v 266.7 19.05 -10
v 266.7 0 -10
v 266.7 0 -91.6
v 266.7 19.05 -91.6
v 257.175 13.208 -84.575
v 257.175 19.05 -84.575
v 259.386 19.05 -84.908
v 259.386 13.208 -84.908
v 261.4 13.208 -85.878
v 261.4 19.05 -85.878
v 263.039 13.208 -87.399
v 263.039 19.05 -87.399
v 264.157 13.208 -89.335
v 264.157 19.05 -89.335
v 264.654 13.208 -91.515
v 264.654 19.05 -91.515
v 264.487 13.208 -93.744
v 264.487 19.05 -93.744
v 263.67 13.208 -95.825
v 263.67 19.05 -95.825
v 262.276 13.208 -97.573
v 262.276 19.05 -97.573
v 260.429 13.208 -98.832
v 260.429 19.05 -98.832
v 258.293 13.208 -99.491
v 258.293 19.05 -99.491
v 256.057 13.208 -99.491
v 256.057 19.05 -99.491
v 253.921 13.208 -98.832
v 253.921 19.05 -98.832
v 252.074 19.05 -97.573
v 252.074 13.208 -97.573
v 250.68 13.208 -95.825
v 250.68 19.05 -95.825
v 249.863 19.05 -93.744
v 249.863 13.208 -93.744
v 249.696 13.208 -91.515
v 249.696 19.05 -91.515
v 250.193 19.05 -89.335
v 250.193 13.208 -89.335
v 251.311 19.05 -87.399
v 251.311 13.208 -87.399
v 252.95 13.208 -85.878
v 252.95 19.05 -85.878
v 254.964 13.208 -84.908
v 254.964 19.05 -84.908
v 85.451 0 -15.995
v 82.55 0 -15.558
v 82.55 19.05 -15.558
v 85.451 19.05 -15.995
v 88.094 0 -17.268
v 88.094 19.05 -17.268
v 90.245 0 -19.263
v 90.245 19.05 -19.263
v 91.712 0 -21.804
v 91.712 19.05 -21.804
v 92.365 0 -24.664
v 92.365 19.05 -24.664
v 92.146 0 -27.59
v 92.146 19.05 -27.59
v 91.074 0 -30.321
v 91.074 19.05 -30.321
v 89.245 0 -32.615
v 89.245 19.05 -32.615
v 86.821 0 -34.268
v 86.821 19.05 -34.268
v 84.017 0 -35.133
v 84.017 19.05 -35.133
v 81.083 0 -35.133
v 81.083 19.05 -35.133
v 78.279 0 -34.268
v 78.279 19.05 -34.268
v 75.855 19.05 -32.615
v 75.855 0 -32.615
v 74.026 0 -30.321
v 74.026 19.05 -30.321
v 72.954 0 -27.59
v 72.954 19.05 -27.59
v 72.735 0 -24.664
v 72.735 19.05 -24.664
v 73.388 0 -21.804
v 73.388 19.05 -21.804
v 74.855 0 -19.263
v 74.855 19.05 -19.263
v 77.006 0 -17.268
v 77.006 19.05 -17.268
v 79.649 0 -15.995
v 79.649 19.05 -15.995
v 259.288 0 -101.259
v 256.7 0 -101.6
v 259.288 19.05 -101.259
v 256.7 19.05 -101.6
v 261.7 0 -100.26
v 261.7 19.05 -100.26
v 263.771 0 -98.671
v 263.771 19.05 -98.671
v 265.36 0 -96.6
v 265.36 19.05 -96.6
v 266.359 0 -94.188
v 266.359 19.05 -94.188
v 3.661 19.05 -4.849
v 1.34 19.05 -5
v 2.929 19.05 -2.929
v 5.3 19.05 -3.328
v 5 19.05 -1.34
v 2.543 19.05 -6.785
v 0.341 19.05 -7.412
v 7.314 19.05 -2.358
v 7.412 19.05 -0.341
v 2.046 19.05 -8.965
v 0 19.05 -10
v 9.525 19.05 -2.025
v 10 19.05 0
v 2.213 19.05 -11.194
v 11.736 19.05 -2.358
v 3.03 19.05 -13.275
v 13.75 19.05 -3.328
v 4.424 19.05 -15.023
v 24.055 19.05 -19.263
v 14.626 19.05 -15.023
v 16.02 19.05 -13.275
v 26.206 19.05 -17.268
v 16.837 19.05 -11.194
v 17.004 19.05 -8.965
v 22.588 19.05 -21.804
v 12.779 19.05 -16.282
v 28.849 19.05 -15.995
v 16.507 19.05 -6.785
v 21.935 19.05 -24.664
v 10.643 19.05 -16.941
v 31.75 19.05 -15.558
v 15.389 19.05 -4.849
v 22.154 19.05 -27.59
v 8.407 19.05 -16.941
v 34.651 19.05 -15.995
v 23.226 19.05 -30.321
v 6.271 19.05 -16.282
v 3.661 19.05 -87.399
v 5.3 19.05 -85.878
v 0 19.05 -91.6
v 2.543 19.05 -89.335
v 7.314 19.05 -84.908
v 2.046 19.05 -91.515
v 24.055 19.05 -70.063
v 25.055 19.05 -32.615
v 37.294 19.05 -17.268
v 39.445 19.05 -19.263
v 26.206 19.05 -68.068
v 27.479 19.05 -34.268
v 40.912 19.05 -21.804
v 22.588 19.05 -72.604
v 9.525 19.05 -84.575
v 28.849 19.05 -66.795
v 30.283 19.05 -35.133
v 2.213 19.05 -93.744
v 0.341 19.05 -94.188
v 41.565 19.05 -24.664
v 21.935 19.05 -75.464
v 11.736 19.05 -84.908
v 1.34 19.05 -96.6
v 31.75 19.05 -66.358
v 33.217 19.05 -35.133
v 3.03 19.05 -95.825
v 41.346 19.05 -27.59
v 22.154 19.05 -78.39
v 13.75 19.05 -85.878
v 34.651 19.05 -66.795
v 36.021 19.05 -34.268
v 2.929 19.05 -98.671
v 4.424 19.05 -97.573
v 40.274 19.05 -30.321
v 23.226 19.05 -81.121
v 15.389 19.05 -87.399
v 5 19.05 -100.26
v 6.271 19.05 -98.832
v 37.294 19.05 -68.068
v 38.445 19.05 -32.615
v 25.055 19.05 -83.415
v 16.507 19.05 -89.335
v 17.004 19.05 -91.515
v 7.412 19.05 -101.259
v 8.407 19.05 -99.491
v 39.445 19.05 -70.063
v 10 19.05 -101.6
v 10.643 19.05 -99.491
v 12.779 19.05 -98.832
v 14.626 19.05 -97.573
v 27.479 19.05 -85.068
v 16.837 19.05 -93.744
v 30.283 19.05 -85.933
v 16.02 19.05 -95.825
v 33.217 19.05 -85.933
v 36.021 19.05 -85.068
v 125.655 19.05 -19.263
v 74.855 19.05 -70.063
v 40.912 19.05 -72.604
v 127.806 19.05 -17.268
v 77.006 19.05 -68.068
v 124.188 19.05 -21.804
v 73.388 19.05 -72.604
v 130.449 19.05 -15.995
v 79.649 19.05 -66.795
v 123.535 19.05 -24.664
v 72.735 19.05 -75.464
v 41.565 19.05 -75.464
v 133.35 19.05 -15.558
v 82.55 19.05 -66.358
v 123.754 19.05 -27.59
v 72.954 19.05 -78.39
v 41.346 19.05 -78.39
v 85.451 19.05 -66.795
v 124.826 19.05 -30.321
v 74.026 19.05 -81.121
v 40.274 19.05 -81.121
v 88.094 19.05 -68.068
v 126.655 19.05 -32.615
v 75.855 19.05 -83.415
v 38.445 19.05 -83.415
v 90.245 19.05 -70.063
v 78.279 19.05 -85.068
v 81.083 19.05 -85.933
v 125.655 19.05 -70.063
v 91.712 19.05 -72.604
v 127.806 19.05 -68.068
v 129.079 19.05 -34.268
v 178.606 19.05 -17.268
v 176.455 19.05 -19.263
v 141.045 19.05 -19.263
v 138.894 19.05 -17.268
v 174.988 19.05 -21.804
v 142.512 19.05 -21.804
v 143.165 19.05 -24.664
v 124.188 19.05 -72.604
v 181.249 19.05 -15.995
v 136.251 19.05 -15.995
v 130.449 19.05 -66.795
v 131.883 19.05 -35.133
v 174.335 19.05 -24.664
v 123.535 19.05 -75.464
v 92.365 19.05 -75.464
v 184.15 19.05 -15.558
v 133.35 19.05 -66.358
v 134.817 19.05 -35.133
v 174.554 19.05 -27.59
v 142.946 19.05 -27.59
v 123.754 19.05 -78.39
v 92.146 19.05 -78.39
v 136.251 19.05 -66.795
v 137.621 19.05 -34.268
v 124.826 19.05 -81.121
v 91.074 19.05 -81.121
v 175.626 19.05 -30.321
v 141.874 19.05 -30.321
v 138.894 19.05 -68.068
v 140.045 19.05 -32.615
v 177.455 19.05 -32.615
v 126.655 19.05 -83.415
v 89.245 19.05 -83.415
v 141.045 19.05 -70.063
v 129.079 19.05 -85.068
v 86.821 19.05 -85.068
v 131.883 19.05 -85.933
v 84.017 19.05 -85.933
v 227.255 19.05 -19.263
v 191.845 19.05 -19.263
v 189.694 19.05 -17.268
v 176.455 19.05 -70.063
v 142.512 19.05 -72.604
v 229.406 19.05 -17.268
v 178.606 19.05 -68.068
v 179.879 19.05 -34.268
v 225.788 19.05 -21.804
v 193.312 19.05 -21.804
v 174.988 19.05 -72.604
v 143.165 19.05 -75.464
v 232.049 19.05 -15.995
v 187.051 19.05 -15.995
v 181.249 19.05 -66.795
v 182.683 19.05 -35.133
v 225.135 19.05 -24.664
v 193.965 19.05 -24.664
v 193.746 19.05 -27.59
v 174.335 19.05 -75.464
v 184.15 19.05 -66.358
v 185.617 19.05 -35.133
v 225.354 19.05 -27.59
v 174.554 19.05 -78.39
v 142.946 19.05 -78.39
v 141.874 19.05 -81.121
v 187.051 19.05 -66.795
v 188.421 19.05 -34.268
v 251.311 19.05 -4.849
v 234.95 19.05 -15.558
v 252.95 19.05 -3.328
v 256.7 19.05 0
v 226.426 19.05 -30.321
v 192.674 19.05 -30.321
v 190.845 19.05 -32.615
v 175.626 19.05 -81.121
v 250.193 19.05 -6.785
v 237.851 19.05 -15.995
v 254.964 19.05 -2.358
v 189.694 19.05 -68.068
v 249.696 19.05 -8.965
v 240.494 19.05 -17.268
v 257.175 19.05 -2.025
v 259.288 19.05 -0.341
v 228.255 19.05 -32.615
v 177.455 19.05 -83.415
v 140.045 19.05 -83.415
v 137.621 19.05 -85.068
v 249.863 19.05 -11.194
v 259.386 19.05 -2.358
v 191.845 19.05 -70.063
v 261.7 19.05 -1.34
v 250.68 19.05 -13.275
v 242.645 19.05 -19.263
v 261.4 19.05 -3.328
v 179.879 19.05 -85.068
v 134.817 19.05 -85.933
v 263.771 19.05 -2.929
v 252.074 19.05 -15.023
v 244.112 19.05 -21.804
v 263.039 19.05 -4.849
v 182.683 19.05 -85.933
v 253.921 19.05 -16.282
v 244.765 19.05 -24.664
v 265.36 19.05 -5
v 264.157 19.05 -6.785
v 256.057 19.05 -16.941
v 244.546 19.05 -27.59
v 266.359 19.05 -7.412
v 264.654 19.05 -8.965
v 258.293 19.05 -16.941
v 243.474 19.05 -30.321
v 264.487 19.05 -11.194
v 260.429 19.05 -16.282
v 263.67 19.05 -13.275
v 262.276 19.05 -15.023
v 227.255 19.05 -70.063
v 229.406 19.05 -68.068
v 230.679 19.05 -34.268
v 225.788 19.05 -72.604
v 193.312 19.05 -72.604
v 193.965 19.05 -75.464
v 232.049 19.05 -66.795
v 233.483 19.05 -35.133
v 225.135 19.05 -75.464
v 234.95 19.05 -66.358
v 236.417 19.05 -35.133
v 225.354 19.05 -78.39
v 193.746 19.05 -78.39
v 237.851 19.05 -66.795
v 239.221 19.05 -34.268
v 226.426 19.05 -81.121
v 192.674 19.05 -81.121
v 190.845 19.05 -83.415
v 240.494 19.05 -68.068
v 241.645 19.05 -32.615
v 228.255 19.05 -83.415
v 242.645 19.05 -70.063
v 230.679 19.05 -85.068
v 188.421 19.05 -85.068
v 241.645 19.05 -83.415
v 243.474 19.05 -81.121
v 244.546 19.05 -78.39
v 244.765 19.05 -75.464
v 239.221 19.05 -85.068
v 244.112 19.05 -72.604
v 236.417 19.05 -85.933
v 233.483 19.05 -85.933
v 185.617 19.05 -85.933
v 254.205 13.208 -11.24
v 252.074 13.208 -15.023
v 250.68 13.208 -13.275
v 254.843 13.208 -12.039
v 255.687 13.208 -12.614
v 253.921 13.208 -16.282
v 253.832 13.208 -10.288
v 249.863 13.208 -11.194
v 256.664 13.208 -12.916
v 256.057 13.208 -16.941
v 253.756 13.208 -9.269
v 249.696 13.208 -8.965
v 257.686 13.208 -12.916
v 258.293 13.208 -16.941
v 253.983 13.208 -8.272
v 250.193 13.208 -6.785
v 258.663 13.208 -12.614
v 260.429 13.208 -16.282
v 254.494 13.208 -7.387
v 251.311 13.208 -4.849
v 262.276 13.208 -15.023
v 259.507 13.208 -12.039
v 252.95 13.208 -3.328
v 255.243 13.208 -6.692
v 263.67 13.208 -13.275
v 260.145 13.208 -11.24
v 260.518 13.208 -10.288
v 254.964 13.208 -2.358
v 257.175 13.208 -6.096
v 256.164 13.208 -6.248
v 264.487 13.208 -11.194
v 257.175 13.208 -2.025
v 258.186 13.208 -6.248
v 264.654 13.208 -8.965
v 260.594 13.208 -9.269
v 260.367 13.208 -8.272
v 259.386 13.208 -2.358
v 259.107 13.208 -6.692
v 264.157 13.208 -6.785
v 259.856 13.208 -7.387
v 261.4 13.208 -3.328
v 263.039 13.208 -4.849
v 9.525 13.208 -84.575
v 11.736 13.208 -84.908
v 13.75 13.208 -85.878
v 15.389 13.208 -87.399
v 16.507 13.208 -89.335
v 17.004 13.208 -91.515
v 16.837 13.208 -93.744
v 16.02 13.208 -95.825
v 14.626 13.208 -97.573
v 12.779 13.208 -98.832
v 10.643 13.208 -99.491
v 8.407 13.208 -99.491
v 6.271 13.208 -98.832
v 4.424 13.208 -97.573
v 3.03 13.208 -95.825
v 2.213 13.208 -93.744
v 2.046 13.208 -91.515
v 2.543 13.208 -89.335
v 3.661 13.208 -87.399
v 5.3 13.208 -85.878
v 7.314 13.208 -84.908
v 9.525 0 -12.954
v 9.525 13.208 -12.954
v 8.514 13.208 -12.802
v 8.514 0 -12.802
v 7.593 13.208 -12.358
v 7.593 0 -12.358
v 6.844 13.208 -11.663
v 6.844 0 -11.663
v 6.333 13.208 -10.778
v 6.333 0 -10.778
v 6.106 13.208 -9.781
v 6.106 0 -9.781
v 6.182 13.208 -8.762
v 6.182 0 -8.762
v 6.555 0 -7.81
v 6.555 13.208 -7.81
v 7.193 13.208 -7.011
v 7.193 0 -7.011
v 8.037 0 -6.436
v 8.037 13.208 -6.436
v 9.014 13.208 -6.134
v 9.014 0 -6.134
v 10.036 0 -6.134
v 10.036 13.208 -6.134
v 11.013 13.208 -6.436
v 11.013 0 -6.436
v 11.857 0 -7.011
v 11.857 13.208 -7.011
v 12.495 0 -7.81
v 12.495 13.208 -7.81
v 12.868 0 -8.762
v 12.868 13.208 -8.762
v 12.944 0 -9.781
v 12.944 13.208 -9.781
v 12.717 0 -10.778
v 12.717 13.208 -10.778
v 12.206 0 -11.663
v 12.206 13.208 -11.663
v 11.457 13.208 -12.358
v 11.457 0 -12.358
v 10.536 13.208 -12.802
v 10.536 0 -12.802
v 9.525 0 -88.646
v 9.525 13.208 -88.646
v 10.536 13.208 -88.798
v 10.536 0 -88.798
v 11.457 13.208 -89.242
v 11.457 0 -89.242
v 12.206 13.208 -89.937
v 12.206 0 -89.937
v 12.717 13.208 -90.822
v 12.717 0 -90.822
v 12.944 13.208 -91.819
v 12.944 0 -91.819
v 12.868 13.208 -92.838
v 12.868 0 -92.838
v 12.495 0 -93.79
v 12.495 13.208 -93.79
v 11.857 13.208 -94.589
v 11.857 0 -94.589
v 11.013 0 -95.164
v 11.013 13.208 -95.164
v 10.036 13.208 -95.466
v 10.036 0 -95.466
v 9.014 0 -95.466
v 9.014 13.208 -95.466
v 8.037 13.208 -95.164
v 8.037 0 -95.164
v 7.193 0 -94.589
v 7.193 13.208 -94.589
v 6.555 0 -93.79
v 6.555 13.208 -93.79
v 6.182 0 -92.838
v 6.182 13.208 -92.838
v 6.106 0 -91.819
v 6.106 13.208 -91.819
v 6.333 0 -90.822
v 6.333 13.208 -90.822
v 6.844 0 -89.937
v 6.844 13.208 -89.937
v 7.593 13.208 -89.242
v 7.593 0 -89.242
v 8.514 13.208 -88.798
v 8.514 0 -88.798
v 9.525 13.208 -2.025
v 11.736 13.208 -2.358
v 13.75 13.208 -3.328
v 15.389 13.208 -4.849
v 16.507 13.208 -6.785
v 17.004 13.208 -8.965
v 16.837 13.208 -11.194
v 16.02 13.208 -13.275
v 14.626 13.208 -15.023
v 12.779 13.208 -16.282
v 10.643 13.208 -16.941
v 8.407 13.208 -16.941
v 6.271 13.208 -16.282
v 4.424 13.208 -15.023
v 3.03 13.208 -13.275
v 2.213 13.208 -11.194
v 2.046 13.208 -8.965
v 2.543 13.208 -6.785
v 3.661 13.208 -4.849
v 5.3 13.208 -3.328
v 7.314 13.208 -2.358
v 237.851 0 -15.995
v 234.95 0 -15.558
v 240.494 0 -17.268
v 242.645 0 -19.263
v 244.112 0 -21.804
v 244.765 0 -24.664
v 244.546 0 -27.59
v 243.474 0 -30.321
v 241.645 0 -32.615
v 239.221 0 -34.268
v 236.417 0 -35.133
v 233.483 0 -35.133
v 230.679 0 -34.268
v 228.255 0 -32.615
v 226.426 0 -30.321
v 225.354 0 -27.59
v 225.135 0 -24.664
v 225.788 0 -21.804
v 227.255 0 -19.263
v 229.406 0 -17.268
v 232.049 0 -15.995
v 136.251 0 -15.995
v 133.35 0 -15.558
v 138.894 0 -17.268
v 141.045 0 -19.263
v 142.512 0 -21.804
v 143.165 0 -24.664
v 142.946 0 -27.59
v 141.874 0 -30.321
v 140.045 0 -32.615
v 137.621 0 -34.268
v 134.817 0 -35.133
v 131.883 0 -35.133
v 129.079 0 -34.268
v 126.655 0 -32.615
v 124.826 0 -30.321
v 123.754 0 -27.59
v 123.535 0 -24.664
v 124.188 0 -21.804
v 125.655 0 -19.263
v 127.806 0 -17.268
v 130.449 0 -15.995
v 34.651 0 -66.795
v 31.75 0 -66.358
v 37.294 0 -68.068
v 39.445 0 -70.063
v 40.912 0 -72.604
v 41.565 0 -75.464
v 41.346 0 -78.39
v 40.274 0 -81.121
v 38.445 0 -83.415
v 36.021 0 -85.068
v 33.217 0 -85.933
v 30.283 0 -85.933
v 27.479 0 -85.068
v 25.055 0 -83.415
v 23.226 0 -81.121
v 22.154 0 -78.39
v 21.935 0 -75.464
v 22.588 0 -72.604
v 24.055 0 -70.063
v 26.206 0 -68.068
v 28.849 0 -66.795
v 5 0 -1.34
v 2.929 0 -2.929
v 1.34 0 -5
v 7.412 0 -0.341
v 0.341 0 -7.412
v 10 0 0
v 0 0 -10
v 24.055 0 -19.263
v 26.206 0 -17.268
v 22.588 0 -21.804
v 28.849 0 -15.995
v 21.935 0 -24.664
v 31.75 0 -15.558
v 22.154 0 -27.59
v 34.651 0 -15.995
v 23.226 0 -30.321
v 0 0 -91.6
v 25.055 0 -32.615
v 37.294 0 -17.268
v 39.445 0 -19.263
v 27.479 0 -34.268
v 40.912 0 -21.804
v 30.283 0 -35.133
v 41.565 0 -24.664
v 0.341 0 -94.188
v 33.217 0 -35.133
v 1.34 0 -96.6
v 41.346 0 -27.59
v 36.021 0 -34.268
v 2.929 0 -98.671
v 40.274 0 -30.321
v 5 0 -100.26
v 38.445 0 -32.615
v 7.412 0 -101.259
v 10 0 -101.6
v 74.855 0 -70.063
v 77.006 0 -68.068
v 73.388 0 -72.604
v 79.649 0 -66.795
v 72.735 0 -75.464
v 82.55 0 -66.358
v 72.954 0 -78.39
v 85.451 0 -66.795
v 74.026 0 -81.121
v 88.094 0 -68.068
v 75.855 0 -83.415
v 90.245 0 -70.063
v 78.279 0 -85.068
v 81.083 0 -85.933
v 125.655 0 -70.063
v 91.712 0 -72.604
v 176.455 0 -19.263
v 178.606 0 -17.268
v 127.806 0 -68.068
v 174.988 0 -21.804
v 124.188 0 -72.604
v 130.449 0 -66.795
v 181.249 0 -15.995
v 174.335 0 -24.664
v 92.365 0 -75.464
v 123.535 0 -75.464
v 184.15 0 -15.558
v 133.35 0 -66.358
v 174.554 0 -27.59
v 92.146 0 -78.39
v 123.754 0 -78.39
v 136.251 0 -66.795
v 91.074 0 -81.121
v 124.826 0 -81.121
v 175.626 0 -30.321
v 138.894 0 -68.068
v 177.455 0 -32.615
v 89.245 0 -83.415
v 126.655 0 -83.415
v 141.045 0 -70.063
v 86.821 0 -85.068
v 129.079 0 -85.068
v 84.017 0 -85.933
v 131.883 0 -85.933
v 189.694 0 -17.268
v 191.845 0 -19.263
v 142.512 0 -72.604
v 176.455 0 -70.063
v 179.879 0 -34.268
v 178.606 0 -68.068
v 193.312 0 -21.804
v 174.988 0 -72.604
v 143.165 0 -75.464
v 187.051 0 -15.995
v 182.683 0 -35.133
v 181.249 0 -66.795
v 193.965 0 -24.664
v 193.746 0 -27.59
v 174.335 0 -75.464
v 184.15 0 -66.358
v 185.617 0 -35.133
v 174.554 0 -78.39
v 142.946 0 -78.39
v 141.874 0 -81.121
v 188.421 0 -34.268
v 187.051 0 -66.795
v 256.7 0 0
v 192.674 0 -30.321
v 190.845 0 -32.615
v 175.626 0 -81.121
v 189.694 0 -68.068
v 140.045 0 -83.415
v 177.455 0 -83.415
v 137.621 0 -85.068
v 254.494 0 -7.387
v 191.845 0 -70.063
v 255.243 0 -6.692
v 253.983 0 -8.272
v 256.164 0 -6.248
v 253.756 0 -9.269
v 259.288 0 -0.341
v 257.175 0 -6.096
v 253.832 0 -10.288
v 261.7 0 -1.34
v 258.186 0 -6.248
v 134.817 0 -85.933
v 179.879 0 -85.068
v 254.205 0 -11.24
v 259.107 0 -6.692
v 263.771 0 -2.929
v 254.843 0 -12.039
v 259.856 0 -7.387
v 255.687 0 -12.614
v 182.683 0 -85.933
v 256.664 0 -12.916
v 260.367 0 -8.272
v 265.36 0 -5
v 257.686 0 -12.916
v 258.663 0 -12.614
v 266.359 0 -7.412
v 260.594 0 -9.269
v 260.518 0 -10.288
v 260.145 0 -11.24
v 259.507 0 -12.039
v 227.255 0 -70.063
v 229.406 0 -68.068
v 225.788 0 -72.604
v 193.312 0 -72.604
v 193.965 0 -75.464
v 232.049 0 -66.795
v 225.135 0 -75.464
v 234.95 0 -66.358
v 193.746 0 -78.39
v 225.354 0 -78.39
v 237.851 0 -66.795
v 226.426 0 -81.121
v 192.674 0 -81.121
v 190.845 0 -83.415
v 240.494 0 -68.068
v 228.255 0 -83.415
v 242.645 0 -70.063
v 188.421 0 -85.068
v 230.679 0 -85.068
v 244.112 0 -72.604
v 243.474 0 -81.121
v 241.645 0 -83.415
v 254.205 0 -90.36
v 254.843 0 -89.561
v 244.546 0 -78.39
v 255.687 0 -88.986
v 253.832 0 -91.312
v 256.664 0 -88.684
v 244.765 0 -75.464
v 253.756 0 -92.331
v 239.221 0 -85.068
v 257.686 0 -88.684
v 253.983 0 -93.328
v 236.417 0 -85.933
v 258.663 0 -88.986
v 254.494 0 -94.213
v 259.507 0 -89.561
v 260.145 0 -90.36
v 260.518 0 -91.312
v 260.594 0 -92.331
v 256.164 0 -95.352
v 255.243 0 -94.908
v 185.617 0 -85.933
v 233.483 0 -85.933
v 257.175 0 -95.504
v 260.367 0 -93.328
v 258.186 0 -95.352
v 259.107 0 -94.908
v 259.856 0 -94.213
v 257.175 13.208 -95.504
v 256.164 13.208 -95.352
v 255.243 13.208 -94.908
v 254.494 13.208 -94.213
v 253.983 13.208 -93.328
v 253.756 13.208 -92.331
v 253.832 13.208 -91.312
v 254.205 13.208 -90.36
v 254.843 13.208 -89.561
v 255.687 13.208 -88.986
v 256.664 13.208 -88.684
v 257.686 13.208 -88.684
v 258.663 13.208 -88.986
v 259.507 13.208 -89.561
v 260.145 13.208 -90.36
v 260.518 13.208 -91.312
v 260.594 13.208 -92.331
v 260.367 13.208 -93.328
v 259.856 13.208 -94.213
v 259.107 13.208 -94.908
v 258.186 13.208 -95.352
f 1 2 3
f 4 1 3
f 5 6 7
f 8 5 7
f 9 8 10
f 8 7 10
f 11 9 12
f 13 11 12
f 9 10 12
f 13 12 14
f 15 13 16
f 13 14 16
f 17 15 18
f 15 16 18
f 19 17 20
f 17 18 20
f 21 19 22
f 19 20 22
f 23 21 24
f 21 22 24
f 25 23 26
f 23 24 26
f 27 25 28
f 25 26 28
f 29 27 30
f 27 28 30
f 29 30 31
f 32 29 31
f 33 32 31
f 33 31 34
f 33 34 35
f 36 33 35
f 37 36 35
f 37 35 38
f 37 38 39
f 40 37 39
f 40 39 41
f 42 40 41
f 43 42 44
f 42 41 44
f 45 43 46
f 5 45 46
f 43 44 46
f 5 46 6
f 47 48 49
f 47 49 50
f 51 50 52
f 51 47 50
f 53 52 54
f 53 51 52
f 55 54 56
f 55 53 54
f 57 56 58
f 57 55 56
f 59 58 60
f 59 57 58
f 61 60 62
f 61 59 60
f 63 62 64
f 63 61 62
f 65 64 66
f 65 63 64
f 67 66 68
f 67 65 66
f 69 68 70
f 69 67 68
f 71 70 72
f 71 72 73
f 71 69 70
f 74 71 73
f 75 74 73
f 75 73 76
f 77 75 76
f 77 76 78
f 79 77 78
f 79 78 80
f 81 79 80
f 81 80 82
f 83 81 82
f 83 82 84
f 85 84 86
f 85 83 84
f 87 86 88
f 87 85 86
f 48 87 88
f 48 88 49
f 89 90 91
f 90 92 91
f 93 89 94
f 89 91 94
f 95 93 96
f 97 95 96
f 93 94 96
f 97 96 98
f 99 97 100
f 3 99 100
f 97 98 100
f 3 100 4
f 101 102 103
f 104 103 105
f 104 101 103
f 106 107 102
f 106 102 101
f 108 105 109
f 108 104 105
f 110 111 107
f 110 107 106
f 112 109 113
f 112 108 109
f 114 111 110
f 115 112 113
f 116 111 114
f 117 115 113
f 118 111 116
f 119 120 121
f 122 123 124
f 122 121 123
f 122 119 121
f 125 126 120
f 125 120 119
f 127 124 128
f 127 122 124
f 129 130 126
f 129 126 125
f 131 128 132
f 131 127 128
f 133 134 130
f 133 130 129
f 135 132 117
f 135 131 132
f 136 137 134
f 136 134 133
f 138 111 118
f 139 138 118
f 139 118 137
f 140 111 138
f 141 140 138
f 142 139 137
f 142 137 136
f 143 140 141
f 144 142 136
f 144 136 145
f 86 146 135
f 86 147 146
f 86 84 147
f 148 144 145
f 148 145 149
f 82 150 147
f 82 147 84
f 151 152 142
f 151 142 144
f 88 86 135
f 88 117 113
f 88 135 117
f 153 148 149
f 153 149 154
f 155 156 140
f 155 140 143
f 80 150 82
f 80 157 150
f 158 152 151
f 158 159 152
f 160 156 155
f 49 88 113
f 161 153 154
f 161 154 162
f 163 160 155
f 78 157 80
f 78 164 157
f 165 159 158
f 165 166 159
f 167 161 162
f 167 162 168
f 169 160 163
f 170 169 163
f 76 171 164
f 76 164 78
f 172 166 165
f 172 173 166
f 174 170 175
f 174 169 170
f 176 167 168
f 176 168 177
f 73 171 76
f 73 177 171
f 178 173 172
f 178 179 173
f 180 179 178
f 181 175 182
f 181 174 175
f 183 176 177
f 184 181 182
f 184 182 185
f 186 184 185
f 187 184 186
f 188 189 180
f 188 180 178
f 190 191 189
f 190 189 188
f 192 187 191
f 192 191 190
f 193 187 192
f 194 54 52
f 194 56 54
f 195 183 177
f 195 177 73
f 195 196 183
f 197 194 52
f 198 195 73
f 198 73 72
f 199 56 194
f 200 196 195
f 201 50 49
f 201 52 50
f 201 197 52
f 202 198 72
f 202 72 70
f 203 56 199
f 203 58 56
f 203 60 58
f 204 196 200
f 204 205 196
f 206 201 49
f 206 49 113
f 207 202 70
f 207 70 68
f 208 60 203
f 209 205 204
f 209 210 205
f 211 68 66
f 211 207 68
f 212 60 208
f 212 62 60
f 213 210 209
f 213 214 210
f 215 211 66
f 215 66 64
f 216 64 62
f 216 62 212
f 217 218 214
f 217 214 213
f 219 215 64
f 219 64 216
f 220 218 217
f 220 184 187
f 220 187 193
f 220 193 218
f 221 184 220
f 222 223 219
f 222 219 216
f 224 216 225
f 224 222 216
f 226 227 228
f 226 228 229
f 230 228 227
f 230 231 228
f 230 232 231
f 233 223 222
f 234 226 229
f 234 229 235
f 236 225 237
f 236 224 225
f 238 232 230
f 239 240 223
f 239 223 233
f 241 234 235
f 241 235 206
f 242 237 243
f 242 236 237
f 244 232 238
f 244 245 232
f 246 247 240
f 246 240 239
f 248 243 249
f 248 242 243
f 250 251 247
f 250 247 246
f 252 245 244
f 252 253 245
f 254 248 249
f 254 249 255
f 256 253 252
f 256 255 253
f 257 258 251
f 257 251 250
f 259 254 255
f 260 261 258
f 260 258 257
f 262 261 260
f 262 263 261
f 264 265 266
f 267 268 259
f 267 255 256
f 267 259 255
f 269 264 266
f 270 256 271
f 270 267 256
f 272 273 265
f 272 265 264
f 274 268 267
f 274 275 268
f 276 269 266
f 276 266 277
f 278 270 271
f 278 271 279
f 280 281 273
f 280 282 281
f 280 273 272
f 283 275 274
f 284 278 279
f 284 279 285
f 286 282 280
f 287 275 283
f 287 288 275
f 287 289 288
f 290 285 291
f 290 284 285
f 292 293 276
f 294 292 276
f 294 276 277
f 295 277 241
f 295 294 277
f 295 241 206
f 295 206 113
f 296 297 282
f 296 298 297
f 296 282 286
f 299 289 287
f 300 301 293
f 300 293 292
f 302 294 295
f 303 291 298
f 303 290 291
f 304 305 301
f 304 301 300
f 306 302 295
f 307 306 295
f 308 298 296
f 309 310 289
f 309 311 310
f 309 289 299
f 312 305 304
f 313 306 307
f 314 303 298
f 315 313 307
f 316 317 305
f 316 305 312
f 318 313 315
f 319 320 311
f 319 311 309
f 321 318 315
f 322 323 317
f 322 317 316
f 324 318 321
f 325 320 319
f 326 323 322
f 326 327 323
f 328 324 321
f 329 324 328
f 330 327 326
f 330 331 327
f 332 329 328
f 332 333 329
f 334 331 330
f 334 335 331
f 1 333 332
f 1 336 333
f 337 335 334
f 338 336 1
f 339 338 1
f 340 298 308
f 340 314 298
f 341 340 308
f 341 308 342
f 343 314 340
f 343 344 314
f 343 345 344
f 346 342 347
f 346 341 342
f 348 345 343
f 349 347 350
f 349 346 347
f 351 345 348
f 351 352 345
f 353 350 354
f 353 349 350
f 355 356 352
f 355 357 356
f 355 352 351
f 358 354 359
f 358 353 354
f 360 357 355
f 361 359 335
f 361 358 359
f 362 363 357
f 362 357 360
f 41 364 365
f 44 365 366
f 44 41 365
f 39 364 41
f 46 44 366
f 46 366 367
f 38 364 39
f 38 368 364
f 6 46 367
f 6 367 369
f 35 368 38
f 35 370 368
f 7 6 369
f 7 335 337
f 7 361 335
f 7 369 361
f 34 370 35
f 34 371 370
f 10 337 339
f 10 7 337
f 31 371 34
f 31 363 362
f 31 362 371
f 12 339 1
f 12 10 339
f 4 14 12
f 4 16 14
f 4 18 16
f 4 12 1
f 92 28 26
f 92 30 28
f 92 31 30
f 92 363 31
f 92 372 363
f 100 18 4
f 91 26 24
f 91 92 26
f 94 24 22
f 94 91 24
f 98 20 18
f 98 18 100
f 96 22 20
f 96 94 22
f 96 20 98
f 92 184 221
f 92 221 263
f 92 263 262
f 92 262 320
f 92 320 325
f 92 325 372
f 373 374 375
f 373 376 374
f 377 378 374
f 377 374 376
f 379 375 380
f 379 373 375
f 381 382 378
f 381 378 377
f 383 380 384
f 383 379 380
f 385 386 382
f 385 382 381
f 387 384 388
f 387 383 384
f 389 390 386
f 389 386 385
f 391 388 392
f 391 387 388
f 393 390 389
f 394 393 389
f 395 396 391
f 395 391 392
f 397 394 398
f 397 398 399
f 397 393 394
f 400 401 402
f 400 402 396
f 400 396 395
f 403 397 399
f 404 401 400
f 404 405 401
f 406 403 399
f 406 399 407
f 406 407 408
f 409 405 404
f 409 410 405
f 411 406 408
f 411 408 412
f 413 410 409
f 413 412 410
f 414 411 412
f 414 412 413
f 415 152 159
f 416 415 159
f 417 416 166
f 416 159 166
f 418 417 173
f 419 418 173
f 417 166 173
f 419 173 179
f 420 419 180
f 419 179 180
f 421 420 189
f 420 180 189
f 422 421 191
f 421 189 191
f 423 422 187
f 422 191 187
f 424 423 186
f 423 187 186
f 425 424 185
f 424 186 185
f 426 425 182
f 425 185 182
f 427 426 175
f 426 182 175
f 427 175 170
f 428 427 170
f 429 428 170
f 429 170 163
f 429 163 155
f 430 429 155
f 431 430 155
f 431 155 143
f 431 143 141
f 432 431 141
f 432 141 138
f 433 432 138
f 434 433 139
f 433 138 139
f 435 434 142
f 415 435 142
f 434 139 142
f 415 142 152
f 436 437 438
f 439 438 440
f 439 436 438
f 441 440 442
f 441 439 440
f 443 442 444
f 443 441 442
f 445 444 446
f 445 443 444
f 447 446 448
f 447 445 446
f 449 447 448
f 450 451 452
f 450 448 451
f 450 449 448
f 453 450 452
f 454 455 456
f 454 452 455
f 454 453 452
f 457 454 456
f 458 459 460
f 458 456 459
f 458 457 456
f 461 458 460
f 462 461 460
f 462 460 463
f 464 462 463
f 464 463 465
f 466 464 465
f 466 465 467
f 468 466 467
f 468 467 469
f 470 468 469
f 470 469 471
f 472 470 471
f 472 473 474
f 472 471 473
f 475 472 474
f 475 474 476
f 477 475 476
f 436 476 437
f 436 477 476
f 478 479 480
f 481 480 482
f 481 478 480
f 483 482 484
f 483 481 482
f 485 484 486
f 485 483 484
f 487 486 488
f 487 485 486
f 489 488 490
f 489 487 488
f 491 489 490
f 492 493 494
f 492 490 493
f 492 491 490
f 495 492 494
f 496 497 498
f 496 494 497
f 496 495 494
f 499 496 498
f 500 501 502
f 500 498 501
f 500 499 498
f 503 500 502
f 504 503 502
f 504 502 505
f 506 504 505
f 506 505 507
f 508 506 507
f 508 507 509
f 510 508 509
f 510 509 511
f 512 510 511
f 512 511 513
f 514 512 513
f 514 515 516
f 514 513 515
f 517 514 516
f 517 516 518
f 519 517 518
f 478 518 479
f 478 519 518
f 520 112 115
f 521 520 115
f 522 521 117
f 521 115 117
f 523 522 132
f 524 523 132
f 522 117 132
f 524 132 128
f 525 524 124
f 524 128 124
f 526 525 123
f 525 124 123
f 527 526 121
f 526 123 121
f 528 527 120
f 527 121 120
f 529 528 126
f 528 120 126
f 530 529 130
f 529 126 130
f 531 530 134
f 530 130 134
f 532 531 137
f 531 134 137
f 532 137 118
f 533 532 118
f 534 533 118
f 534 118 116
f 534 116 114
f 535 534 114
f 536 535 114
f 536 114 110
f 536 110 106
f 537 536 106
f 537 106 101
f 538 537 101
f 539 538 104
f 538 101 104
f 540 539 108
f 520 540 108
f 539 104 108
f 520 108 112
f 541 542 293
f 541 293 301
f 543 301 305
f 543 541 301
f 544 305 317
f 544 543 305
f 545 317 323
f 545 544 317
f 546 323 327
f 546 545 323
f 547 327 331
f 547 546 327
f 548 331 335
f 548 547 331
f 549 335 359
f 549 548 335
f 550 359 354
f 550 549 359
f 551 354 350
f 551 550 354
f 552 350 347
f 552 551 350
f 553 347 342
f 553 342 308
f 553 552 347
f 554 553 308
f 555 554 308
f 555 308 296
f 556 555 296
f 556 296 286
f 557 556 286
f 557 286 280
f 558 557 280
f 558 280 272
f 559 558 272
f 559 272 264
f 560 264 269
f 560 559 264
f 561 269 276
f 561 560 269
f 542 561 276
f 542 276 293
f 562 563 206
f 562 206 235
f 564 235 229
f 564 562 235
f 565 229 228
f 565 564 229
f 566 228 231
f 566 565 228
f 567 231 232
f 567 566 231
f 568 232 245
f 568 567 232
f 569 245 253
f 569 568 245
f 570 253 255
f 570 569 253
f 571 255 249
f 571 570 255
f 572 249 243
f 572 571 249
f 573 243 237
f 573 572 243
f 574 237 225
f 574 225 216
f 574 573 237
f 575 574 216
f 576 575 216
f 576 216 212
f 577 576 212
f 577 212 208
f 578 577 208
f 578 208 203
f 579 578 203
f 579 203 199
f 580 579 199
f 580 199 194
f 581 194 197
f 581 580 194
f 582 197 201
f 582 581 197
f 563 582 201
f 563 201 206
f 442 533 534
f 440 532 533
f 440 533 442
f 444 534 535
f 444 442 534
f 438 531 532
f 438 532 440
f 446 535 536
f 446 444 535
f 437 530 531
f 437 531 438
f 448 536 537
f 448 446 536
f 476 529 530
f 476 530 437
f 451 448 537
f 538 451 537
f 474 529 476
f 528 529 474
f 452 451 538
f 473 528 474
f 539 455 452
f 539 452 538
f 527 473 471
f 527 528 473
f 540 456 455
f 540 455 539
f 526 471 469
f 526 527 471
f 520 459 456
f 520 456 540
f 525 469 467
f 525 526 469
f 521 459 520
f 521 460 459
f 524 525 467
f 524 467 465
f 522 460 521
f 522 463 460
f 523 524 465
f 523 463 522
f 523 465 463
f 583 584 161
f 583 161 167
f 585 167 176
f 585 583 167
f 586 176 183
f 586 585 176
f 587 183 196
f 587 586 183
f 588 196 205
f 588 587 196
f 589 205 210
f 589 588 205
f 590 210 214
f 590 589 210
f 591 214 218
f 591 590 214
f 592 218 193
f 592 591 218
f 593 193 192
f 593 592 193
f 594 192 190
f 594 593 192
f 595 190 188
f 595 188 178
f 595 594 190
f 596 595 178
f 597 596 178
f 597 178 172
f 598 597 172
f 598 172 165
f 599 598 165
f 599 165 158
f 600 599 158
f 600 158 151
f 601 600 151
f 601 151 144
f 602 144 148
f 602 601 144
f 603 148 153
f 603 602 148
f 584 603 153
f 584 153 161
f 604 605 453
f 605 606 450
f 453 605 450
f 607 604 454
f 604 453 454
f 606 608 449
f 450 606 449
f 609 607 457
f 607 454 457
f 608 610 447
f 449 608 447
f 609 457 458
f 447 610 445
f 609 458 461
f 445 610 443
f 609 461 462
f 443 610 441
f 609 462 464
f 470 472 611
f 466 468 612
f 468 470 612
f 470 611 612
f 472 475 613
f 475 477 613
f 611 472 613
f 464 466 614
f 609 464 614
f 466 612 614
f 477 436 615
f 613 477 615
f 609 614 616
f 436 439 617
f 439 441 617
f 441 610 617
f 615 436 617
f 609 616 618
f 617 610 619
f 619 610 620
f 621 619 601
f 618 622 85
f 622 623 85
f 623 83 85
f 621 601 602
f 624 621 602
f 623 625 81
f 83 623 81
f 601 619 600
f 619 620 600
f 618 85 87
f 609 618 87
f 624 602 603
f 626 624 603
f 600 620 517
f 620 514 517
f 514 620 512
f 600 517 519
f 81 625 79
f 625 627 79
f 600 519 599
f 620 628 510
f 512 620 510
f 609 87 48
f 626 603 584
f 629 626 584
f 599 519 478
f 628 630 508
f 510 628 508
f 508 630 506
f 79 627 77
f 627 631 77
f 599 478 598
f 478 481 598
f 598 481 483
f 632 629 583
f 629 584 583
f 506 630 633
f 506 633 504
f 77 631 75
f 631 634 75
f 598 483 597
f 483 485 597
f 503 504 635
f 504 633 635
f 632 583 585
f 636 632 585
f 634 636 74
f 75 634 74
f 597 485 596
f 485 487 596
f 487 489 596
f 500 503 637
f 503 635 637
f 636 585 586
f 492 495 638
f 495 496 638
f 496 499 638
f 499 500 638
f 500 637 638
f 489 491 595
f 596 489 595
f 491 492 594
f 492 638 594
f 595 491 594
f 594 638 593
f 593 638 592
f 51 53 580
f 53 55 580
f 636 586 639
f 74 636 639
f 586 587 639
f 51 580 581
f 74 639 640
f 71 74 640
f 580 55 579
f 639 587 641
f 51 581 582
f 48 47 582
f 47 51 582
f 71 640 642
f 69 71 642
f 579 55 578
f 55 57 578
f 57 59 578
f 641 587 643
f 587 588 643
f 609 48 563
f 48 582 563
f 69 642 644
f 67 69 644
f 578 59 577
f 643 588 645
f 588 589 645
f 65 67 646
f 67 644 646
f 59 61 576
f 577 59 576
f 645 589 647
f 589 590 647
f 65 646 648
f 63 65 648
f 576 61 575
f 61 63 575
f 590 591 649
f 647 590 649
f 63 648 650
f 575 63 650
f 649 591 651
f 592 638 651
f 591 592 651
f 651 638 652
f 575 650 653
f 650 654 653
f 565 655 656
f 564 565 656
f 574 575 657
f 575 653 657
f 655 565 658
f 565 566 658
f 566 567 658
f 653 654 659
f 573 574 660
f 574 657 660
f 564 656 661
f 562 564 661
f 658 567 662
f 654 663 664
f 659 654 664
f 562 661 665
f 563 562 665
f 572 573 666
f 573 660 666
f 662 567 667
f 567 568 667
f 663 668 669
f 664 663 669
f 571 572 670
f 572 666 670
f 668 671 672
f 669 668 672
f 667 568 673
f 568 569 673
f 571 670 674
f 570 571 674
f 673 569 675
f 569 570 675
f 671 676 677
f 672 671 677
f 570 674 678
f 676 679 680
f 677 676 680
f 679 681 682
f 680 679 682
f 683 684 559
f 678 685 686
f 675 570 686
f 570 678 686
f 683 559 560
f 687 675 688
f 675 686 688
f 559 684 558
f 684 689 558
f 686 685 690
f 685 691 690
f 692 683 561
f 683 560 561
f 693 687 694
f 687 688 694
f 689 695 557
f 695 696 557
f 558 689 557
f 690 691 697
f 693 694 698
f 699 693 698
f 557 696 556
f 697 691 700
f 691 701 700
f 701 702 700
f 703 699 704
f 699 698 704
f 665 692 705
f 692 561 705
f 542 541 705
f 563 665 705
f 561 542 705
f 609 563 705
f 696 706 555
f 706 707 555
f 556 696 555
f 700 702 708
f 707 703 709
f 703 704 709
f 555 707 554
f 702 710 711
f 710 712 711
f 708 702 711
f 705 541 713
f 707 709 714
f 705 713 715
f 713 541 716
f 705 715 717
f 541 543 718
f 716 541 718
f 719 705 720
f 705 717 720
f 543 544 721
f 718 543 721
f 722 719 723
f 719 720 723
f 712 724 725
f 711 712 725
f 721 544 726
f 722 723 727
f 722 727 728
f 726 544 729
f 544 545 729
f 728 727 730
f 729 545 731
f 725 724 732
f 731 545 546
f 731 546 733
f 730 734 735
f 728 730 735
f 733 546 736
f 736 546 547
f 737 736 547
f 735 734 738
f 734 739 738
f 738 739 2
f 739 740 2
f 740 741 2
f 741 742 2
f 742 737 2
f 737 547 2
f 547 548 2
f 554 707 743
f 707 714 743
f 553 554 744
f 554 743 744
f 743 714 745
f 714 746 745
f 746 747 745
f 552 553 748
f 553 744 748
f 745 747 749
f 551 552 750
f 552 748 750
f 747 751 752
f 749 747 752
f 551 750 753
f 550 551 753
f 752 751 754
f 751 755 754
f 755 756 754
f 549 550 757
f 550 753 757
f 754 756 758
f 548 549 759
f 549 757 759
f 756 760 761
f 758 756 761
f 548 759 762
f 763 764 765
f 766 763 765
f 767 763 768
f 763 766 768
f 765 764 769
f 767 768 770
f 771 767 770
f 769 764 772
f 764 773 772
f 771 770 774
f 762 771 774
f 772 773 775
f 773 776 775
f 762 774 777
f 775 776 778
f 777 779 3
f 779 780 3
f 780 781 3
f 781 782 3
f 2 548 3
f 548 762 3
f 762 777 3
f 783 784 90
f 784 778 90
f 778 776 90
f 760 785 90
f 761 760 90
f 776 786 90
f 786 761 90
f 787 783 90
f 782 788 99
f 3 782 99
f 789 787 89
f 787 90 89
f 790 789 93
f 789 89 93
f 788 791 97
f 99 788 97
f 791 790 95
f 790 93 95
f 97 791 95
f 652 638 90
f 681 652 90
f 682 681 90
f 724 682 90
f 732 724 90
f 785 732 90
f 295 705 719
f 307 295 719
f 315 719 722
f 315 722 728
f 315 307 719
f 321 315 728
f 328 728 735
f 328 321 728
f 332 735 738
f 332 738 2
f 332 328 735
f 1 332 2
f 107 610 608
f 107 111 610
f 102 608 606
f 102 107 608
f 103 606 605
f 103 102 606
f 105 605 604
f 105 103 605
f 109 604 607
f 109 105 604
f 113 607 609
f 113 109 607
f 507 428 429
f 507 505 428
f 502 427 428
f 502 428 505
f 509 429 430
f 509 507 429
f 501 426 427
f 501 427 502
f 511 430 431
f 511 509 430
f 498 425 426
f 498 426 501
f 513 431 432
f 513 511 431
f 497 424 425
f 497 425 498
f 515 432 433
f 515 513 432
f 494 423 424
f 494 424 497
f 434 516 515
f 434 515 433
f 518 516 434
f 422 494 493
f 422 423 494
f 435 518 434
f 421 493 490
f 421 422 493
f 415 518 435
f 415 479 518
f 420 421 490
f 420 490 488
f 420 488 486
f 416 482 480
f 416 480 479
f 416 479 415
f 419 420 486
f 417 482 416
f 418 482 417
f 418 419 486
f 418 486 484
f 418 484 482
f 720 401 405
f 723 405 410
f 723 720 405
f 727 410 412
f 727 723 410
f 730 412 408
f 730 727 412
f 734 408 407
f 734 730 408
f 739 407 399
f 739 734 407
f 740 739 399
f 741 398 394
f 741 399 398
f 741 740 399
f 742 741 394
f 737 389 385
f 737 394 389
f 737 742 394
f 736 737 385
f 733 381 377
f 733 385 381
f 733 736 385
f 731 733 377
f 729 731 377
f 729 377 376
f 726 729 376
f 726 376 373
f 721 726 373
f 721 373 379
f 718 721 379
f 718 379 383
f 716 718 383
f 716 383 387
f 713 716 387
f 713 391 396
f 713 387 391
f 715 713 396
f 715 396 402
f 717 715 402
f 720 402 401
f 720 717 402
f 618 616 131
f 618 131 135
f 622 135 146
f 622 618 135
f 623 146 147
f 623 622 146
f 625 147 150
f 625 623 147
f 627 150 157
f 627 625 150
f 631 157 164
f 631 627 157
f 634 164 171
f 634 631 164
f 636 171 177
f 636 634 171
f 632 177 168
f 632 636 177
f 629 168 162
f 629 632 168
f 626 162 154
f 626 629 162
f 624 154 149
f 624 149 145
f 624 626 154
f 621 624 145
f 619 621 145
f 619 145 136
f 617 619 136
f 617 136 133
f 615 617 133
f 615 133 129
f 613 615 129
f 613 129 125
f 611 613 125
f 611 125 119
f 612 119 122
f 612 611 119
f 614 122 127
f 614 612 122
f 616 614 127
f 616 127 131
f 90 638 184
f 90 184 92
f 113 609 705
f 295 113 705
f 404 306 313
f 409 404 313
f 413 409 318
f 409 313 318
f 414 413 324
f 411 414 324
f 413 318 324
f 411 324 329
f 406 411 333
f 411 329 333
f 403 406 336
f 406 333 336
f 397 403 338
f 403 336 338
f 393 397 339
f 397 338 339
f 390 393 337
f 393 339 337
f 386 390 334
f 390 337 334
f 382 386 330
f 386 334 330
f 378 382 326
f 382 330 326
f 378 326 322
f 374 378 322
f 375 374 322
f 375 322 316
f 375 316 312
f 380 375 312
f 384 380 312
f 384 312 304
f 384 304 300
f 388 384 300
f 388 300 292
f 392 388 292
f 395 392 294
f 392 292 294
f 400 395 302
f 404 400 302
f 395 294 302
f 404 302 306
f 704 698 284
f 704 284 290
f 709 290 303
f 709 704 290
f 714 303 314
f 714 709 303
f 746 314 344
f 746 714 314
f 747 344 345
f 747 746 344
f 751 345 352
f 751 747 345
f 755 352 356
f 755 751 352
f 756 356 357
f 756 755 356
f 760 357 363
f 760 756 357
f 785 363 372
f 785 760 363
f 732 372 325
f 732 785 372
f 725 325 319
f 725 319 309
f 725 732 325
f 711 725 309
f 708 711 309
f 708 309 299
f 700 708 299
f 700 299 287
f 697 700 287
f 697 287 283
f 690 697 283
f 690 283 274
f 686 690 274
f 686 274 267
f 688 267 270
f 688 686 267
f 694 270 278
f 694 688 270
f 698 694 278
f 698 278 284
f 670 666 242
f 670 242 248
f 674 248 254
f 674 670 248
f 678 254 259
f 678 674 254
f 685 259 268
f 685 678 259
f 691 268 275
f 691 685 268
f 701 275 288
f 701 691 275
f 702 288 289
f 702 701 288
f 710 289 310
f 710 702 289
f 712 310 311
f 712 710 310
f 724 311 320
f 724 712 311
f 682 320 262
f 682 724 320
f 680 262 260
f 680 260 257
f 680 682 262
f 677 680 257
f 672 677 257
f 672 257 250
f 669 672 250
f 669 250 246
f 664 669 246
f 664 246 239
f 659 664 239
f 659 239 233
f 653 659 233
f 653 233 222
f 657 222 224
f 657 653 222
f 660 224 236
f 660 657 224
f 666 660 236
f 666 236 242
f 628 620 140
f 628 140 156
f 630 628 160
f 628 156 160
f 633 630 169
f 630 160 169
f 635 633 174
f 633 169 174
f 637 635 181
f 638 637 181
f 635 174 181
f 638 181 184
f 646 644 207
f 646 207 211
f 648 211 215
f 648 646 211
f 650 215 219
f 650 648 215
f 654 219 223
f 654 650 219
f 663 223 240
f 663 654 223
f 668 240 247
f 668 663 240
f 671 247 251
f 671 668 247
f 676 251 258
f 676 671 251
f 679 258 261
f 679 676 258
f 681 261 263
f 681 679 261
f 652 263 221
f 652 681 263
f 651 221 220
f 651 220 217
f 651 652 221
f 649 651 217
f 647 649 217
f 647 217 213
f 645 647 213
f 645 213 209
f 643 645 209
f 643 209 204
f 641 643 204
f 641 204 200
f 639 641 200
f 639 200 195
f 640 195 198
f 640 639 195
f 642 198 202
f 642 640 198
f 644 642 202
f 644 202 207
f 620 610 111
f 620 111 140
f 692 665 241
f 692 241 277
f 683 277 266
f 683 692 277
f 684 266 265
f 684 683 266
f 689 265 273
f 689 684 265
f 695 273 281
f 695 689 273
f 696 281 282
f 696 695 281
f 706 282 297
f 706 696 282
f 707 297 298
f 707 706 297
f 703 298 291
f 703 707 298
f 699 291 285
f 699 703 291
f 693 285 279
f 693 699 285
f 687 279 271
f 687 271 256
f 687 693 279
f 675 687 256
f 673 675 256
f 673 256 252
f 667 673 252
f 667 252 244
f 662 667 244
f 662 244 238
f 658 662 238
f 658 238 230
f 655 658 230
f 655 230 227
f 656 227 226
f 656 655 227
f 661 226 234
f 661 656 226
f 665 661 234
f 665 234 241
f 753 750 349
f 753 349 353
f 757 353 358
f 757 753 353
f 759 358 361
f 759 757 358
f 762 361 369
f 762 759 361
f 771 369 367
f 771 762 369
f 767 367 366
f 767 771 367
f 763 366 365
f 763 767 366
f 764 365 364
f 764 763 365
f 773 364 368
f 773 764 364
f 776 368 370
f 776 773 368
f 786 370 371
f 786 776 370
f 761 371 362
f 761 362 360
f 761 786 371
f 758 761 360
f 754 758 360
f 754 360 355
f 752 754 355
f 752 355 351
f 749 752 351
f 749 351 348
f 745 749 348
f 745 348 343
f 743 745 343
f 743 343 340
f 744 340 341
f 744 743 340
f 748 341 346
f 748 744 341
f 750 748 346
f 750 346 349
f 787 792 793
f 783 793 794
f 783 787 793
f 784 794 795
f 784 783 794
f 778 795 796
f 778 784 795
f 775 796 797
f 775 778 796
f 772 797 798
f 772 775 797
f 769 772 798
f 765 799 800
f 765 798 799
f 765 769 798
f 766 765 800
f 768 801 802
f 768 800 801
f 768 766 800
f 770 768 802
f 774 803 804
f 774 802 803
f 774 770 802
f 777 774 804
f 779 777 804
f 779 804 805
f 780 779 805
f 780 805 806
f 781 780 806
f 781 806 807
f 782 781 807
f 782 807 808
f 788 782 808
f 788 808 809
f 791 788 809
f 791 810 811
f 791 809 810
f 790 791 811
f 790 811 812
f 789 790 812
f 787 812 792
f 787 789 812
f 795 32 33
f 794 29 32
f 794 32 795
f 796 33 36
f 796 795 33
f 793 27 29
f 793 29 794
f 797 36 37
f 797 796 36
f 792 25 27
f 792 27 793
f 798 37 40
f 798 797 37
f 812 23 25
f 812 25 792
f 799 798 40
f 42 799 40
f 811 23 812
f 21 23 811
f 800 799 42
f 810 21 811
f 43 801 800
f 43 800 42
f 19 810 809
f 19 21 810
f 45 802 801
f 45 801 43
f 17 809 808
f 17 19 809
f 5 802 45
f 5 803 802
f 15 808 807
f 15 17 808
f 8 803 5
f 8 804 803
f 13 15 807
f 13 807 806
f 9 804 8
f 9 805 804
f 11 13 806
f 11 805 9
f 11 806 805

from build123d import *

# Parameters (mm, degrees)
SKETCH1_W           = 266.7
SKETCH1_H           = 101.6
SKETCH1_R           = 9.8425
SKETCH1_R_2         = 3.429
BOSS_EXTRUDE1_DEPTH = 19.05
FILLET1_R           = 10
SKETCH2_R           = 7.5
CUT_EXTRUDE1_DEPTH  = 5.842


with BuildPart() as part:
    # Sketch1 → Boss-Extrude1 (new body)
    with BuildSketch(Plane(origin=(0, 0, 0), x_dir=(1, 0, 0), z_dir=(0, 1, 0))):
        with Locations((133.35, 50.8)):
            Rectangle(SKETCH1_W, SKETCH1_H)
        with Locations(Location((31.75, 25.4, 0), (0, 0, 270))):  # turned: the seam where the file's is
            Circle(SKETCH1_R, mode=Mode.SUBTRACT)
        with Locations(Location((82.55, 25.4, 0), (0, 0, 270))):  # turned: the seam where the file's is
            Circle(SKETCH1_R, mode=Mode.SUBTRACT)
        with Locations(Location((133.35, 25.4, 0), (0, 0, 270))):  # turned: the seam where the file's is
            Circle(SKETCH1_R, mode=Mode.SUBTRACT)
        with Locations(Location((184.15, 25.4, 0), (0, 0, 270))):  # turned: the seam where the file's is
            Circle(SKETCH1_R, mode=Mode.SUBTRACT)
        with Locations(Location((234.95, 25.4, 0), (0, 0, 270))):  # turned: the seam where the file's is
            Circle(SKETCH1_R, mode=Mode.SUBTRACT)
        with Locations(Location((82.55, 76.2, 0), (0, 0, 270))):  # turned: the seam where the file's is
            Circle(SKETCH1_R, mode=Mode.SUBTRACT)
        with Locations(Location((133.35, 76.2, 0), (0, 0, 270))):  # turned: the seam where the file's is
            Circle(SKETCH1_R, mode=Mode.SUBTRACT)
        with Locations(Location((184.15, 76.2, 0), (0, 0, 270))):  # turned: the seam where the file's is
            Circle(SKETCH1_R, mode=Mode.SUBTRACT)
        with Locations(Location((234.95, 76.2, 0), (0, 0, 270))):  # turned: the seam where the file's is
            Circle(SKETCH1_R, mode=Mode.SUBTRACT)
        with Locations(Location((31.75, 76.2, 0), (0, 0, 270))):  # turned: the seam where the file's is
            Circle(SKETCH1_R, mode=Mode.SUBTRACT)
        with Locations(Location((9.525, 92.075, 0), (0, 0, 270))):  # turned: the seam where the file's is
            Circle(SKETCH1_R_2, mode=Mode.SUBTRACT)
        with Locations(Location((257.175, 92.075, 0), (0, 0, 90))):  # turned: the seam where the file's is
            Circle(SKETCH1_R_2, mode=Mode.SUBTRACT)
        with Locations(Location((9.525, 9.525, 0), (0, 0, 90))):  # turned: the seam where the file's is
            Circle(SKETCH1_R_2, mode=Mode.SUBTRACT)
        with Locations(Location((257.175, 9.525, 0), (0, 0, 270))):  # turned: the seam where the file's is
            Circle(SKETCH1_R_2, mode=Mode.SUBTRACT)
    extrude(amount=BOSS_EXTRUDE1_DEPTH)

    # Fillet1
    fillet1_edges = [part.edges().sort_by_distance(p)[0] for p in [
        (0, 9.525, -101.6),
        (266.7, 9.525, -101.6),
        (266.7, 9.525, 0),
        (0, 9.525, 0),
    ]]
    fillet(fillet1_edges, radius=FILLET1_R)

    # Sketch2 → Cut-Extrude1 (cut)
    with BuildSketch(Plane(origin=(0, 19.05, 0), x_dir=(1, 0, 0), z_dir=(0, 1, 0))):
        with Locations(Location((9.525, 92.075, 0), (0, 0, 270))):  # turned: the seam where the file's is
            Circle(SKETCH2_R)
        with Locations(Location((257.175, 92.075, 0), (0, 0, 270))):  # turned: the seam where the file's is
            Circle(SKETCH2_R)
        with Locations(Location((257.175, 9.525, 0), (0, 0, 270))):  # turned: the seam where the file's is
            Circle(SKETCH2_R)
        with Locations(Location((9.525, 9.525, 0), (0, 0, 270))):  # turned: the seam where the file's is
            Circle(SKETCH2_R)
    extrude(amount=-CUT_EXTRUDE1_DEPTH, mode=Mode.SUBTRACT)


solid = part.part
